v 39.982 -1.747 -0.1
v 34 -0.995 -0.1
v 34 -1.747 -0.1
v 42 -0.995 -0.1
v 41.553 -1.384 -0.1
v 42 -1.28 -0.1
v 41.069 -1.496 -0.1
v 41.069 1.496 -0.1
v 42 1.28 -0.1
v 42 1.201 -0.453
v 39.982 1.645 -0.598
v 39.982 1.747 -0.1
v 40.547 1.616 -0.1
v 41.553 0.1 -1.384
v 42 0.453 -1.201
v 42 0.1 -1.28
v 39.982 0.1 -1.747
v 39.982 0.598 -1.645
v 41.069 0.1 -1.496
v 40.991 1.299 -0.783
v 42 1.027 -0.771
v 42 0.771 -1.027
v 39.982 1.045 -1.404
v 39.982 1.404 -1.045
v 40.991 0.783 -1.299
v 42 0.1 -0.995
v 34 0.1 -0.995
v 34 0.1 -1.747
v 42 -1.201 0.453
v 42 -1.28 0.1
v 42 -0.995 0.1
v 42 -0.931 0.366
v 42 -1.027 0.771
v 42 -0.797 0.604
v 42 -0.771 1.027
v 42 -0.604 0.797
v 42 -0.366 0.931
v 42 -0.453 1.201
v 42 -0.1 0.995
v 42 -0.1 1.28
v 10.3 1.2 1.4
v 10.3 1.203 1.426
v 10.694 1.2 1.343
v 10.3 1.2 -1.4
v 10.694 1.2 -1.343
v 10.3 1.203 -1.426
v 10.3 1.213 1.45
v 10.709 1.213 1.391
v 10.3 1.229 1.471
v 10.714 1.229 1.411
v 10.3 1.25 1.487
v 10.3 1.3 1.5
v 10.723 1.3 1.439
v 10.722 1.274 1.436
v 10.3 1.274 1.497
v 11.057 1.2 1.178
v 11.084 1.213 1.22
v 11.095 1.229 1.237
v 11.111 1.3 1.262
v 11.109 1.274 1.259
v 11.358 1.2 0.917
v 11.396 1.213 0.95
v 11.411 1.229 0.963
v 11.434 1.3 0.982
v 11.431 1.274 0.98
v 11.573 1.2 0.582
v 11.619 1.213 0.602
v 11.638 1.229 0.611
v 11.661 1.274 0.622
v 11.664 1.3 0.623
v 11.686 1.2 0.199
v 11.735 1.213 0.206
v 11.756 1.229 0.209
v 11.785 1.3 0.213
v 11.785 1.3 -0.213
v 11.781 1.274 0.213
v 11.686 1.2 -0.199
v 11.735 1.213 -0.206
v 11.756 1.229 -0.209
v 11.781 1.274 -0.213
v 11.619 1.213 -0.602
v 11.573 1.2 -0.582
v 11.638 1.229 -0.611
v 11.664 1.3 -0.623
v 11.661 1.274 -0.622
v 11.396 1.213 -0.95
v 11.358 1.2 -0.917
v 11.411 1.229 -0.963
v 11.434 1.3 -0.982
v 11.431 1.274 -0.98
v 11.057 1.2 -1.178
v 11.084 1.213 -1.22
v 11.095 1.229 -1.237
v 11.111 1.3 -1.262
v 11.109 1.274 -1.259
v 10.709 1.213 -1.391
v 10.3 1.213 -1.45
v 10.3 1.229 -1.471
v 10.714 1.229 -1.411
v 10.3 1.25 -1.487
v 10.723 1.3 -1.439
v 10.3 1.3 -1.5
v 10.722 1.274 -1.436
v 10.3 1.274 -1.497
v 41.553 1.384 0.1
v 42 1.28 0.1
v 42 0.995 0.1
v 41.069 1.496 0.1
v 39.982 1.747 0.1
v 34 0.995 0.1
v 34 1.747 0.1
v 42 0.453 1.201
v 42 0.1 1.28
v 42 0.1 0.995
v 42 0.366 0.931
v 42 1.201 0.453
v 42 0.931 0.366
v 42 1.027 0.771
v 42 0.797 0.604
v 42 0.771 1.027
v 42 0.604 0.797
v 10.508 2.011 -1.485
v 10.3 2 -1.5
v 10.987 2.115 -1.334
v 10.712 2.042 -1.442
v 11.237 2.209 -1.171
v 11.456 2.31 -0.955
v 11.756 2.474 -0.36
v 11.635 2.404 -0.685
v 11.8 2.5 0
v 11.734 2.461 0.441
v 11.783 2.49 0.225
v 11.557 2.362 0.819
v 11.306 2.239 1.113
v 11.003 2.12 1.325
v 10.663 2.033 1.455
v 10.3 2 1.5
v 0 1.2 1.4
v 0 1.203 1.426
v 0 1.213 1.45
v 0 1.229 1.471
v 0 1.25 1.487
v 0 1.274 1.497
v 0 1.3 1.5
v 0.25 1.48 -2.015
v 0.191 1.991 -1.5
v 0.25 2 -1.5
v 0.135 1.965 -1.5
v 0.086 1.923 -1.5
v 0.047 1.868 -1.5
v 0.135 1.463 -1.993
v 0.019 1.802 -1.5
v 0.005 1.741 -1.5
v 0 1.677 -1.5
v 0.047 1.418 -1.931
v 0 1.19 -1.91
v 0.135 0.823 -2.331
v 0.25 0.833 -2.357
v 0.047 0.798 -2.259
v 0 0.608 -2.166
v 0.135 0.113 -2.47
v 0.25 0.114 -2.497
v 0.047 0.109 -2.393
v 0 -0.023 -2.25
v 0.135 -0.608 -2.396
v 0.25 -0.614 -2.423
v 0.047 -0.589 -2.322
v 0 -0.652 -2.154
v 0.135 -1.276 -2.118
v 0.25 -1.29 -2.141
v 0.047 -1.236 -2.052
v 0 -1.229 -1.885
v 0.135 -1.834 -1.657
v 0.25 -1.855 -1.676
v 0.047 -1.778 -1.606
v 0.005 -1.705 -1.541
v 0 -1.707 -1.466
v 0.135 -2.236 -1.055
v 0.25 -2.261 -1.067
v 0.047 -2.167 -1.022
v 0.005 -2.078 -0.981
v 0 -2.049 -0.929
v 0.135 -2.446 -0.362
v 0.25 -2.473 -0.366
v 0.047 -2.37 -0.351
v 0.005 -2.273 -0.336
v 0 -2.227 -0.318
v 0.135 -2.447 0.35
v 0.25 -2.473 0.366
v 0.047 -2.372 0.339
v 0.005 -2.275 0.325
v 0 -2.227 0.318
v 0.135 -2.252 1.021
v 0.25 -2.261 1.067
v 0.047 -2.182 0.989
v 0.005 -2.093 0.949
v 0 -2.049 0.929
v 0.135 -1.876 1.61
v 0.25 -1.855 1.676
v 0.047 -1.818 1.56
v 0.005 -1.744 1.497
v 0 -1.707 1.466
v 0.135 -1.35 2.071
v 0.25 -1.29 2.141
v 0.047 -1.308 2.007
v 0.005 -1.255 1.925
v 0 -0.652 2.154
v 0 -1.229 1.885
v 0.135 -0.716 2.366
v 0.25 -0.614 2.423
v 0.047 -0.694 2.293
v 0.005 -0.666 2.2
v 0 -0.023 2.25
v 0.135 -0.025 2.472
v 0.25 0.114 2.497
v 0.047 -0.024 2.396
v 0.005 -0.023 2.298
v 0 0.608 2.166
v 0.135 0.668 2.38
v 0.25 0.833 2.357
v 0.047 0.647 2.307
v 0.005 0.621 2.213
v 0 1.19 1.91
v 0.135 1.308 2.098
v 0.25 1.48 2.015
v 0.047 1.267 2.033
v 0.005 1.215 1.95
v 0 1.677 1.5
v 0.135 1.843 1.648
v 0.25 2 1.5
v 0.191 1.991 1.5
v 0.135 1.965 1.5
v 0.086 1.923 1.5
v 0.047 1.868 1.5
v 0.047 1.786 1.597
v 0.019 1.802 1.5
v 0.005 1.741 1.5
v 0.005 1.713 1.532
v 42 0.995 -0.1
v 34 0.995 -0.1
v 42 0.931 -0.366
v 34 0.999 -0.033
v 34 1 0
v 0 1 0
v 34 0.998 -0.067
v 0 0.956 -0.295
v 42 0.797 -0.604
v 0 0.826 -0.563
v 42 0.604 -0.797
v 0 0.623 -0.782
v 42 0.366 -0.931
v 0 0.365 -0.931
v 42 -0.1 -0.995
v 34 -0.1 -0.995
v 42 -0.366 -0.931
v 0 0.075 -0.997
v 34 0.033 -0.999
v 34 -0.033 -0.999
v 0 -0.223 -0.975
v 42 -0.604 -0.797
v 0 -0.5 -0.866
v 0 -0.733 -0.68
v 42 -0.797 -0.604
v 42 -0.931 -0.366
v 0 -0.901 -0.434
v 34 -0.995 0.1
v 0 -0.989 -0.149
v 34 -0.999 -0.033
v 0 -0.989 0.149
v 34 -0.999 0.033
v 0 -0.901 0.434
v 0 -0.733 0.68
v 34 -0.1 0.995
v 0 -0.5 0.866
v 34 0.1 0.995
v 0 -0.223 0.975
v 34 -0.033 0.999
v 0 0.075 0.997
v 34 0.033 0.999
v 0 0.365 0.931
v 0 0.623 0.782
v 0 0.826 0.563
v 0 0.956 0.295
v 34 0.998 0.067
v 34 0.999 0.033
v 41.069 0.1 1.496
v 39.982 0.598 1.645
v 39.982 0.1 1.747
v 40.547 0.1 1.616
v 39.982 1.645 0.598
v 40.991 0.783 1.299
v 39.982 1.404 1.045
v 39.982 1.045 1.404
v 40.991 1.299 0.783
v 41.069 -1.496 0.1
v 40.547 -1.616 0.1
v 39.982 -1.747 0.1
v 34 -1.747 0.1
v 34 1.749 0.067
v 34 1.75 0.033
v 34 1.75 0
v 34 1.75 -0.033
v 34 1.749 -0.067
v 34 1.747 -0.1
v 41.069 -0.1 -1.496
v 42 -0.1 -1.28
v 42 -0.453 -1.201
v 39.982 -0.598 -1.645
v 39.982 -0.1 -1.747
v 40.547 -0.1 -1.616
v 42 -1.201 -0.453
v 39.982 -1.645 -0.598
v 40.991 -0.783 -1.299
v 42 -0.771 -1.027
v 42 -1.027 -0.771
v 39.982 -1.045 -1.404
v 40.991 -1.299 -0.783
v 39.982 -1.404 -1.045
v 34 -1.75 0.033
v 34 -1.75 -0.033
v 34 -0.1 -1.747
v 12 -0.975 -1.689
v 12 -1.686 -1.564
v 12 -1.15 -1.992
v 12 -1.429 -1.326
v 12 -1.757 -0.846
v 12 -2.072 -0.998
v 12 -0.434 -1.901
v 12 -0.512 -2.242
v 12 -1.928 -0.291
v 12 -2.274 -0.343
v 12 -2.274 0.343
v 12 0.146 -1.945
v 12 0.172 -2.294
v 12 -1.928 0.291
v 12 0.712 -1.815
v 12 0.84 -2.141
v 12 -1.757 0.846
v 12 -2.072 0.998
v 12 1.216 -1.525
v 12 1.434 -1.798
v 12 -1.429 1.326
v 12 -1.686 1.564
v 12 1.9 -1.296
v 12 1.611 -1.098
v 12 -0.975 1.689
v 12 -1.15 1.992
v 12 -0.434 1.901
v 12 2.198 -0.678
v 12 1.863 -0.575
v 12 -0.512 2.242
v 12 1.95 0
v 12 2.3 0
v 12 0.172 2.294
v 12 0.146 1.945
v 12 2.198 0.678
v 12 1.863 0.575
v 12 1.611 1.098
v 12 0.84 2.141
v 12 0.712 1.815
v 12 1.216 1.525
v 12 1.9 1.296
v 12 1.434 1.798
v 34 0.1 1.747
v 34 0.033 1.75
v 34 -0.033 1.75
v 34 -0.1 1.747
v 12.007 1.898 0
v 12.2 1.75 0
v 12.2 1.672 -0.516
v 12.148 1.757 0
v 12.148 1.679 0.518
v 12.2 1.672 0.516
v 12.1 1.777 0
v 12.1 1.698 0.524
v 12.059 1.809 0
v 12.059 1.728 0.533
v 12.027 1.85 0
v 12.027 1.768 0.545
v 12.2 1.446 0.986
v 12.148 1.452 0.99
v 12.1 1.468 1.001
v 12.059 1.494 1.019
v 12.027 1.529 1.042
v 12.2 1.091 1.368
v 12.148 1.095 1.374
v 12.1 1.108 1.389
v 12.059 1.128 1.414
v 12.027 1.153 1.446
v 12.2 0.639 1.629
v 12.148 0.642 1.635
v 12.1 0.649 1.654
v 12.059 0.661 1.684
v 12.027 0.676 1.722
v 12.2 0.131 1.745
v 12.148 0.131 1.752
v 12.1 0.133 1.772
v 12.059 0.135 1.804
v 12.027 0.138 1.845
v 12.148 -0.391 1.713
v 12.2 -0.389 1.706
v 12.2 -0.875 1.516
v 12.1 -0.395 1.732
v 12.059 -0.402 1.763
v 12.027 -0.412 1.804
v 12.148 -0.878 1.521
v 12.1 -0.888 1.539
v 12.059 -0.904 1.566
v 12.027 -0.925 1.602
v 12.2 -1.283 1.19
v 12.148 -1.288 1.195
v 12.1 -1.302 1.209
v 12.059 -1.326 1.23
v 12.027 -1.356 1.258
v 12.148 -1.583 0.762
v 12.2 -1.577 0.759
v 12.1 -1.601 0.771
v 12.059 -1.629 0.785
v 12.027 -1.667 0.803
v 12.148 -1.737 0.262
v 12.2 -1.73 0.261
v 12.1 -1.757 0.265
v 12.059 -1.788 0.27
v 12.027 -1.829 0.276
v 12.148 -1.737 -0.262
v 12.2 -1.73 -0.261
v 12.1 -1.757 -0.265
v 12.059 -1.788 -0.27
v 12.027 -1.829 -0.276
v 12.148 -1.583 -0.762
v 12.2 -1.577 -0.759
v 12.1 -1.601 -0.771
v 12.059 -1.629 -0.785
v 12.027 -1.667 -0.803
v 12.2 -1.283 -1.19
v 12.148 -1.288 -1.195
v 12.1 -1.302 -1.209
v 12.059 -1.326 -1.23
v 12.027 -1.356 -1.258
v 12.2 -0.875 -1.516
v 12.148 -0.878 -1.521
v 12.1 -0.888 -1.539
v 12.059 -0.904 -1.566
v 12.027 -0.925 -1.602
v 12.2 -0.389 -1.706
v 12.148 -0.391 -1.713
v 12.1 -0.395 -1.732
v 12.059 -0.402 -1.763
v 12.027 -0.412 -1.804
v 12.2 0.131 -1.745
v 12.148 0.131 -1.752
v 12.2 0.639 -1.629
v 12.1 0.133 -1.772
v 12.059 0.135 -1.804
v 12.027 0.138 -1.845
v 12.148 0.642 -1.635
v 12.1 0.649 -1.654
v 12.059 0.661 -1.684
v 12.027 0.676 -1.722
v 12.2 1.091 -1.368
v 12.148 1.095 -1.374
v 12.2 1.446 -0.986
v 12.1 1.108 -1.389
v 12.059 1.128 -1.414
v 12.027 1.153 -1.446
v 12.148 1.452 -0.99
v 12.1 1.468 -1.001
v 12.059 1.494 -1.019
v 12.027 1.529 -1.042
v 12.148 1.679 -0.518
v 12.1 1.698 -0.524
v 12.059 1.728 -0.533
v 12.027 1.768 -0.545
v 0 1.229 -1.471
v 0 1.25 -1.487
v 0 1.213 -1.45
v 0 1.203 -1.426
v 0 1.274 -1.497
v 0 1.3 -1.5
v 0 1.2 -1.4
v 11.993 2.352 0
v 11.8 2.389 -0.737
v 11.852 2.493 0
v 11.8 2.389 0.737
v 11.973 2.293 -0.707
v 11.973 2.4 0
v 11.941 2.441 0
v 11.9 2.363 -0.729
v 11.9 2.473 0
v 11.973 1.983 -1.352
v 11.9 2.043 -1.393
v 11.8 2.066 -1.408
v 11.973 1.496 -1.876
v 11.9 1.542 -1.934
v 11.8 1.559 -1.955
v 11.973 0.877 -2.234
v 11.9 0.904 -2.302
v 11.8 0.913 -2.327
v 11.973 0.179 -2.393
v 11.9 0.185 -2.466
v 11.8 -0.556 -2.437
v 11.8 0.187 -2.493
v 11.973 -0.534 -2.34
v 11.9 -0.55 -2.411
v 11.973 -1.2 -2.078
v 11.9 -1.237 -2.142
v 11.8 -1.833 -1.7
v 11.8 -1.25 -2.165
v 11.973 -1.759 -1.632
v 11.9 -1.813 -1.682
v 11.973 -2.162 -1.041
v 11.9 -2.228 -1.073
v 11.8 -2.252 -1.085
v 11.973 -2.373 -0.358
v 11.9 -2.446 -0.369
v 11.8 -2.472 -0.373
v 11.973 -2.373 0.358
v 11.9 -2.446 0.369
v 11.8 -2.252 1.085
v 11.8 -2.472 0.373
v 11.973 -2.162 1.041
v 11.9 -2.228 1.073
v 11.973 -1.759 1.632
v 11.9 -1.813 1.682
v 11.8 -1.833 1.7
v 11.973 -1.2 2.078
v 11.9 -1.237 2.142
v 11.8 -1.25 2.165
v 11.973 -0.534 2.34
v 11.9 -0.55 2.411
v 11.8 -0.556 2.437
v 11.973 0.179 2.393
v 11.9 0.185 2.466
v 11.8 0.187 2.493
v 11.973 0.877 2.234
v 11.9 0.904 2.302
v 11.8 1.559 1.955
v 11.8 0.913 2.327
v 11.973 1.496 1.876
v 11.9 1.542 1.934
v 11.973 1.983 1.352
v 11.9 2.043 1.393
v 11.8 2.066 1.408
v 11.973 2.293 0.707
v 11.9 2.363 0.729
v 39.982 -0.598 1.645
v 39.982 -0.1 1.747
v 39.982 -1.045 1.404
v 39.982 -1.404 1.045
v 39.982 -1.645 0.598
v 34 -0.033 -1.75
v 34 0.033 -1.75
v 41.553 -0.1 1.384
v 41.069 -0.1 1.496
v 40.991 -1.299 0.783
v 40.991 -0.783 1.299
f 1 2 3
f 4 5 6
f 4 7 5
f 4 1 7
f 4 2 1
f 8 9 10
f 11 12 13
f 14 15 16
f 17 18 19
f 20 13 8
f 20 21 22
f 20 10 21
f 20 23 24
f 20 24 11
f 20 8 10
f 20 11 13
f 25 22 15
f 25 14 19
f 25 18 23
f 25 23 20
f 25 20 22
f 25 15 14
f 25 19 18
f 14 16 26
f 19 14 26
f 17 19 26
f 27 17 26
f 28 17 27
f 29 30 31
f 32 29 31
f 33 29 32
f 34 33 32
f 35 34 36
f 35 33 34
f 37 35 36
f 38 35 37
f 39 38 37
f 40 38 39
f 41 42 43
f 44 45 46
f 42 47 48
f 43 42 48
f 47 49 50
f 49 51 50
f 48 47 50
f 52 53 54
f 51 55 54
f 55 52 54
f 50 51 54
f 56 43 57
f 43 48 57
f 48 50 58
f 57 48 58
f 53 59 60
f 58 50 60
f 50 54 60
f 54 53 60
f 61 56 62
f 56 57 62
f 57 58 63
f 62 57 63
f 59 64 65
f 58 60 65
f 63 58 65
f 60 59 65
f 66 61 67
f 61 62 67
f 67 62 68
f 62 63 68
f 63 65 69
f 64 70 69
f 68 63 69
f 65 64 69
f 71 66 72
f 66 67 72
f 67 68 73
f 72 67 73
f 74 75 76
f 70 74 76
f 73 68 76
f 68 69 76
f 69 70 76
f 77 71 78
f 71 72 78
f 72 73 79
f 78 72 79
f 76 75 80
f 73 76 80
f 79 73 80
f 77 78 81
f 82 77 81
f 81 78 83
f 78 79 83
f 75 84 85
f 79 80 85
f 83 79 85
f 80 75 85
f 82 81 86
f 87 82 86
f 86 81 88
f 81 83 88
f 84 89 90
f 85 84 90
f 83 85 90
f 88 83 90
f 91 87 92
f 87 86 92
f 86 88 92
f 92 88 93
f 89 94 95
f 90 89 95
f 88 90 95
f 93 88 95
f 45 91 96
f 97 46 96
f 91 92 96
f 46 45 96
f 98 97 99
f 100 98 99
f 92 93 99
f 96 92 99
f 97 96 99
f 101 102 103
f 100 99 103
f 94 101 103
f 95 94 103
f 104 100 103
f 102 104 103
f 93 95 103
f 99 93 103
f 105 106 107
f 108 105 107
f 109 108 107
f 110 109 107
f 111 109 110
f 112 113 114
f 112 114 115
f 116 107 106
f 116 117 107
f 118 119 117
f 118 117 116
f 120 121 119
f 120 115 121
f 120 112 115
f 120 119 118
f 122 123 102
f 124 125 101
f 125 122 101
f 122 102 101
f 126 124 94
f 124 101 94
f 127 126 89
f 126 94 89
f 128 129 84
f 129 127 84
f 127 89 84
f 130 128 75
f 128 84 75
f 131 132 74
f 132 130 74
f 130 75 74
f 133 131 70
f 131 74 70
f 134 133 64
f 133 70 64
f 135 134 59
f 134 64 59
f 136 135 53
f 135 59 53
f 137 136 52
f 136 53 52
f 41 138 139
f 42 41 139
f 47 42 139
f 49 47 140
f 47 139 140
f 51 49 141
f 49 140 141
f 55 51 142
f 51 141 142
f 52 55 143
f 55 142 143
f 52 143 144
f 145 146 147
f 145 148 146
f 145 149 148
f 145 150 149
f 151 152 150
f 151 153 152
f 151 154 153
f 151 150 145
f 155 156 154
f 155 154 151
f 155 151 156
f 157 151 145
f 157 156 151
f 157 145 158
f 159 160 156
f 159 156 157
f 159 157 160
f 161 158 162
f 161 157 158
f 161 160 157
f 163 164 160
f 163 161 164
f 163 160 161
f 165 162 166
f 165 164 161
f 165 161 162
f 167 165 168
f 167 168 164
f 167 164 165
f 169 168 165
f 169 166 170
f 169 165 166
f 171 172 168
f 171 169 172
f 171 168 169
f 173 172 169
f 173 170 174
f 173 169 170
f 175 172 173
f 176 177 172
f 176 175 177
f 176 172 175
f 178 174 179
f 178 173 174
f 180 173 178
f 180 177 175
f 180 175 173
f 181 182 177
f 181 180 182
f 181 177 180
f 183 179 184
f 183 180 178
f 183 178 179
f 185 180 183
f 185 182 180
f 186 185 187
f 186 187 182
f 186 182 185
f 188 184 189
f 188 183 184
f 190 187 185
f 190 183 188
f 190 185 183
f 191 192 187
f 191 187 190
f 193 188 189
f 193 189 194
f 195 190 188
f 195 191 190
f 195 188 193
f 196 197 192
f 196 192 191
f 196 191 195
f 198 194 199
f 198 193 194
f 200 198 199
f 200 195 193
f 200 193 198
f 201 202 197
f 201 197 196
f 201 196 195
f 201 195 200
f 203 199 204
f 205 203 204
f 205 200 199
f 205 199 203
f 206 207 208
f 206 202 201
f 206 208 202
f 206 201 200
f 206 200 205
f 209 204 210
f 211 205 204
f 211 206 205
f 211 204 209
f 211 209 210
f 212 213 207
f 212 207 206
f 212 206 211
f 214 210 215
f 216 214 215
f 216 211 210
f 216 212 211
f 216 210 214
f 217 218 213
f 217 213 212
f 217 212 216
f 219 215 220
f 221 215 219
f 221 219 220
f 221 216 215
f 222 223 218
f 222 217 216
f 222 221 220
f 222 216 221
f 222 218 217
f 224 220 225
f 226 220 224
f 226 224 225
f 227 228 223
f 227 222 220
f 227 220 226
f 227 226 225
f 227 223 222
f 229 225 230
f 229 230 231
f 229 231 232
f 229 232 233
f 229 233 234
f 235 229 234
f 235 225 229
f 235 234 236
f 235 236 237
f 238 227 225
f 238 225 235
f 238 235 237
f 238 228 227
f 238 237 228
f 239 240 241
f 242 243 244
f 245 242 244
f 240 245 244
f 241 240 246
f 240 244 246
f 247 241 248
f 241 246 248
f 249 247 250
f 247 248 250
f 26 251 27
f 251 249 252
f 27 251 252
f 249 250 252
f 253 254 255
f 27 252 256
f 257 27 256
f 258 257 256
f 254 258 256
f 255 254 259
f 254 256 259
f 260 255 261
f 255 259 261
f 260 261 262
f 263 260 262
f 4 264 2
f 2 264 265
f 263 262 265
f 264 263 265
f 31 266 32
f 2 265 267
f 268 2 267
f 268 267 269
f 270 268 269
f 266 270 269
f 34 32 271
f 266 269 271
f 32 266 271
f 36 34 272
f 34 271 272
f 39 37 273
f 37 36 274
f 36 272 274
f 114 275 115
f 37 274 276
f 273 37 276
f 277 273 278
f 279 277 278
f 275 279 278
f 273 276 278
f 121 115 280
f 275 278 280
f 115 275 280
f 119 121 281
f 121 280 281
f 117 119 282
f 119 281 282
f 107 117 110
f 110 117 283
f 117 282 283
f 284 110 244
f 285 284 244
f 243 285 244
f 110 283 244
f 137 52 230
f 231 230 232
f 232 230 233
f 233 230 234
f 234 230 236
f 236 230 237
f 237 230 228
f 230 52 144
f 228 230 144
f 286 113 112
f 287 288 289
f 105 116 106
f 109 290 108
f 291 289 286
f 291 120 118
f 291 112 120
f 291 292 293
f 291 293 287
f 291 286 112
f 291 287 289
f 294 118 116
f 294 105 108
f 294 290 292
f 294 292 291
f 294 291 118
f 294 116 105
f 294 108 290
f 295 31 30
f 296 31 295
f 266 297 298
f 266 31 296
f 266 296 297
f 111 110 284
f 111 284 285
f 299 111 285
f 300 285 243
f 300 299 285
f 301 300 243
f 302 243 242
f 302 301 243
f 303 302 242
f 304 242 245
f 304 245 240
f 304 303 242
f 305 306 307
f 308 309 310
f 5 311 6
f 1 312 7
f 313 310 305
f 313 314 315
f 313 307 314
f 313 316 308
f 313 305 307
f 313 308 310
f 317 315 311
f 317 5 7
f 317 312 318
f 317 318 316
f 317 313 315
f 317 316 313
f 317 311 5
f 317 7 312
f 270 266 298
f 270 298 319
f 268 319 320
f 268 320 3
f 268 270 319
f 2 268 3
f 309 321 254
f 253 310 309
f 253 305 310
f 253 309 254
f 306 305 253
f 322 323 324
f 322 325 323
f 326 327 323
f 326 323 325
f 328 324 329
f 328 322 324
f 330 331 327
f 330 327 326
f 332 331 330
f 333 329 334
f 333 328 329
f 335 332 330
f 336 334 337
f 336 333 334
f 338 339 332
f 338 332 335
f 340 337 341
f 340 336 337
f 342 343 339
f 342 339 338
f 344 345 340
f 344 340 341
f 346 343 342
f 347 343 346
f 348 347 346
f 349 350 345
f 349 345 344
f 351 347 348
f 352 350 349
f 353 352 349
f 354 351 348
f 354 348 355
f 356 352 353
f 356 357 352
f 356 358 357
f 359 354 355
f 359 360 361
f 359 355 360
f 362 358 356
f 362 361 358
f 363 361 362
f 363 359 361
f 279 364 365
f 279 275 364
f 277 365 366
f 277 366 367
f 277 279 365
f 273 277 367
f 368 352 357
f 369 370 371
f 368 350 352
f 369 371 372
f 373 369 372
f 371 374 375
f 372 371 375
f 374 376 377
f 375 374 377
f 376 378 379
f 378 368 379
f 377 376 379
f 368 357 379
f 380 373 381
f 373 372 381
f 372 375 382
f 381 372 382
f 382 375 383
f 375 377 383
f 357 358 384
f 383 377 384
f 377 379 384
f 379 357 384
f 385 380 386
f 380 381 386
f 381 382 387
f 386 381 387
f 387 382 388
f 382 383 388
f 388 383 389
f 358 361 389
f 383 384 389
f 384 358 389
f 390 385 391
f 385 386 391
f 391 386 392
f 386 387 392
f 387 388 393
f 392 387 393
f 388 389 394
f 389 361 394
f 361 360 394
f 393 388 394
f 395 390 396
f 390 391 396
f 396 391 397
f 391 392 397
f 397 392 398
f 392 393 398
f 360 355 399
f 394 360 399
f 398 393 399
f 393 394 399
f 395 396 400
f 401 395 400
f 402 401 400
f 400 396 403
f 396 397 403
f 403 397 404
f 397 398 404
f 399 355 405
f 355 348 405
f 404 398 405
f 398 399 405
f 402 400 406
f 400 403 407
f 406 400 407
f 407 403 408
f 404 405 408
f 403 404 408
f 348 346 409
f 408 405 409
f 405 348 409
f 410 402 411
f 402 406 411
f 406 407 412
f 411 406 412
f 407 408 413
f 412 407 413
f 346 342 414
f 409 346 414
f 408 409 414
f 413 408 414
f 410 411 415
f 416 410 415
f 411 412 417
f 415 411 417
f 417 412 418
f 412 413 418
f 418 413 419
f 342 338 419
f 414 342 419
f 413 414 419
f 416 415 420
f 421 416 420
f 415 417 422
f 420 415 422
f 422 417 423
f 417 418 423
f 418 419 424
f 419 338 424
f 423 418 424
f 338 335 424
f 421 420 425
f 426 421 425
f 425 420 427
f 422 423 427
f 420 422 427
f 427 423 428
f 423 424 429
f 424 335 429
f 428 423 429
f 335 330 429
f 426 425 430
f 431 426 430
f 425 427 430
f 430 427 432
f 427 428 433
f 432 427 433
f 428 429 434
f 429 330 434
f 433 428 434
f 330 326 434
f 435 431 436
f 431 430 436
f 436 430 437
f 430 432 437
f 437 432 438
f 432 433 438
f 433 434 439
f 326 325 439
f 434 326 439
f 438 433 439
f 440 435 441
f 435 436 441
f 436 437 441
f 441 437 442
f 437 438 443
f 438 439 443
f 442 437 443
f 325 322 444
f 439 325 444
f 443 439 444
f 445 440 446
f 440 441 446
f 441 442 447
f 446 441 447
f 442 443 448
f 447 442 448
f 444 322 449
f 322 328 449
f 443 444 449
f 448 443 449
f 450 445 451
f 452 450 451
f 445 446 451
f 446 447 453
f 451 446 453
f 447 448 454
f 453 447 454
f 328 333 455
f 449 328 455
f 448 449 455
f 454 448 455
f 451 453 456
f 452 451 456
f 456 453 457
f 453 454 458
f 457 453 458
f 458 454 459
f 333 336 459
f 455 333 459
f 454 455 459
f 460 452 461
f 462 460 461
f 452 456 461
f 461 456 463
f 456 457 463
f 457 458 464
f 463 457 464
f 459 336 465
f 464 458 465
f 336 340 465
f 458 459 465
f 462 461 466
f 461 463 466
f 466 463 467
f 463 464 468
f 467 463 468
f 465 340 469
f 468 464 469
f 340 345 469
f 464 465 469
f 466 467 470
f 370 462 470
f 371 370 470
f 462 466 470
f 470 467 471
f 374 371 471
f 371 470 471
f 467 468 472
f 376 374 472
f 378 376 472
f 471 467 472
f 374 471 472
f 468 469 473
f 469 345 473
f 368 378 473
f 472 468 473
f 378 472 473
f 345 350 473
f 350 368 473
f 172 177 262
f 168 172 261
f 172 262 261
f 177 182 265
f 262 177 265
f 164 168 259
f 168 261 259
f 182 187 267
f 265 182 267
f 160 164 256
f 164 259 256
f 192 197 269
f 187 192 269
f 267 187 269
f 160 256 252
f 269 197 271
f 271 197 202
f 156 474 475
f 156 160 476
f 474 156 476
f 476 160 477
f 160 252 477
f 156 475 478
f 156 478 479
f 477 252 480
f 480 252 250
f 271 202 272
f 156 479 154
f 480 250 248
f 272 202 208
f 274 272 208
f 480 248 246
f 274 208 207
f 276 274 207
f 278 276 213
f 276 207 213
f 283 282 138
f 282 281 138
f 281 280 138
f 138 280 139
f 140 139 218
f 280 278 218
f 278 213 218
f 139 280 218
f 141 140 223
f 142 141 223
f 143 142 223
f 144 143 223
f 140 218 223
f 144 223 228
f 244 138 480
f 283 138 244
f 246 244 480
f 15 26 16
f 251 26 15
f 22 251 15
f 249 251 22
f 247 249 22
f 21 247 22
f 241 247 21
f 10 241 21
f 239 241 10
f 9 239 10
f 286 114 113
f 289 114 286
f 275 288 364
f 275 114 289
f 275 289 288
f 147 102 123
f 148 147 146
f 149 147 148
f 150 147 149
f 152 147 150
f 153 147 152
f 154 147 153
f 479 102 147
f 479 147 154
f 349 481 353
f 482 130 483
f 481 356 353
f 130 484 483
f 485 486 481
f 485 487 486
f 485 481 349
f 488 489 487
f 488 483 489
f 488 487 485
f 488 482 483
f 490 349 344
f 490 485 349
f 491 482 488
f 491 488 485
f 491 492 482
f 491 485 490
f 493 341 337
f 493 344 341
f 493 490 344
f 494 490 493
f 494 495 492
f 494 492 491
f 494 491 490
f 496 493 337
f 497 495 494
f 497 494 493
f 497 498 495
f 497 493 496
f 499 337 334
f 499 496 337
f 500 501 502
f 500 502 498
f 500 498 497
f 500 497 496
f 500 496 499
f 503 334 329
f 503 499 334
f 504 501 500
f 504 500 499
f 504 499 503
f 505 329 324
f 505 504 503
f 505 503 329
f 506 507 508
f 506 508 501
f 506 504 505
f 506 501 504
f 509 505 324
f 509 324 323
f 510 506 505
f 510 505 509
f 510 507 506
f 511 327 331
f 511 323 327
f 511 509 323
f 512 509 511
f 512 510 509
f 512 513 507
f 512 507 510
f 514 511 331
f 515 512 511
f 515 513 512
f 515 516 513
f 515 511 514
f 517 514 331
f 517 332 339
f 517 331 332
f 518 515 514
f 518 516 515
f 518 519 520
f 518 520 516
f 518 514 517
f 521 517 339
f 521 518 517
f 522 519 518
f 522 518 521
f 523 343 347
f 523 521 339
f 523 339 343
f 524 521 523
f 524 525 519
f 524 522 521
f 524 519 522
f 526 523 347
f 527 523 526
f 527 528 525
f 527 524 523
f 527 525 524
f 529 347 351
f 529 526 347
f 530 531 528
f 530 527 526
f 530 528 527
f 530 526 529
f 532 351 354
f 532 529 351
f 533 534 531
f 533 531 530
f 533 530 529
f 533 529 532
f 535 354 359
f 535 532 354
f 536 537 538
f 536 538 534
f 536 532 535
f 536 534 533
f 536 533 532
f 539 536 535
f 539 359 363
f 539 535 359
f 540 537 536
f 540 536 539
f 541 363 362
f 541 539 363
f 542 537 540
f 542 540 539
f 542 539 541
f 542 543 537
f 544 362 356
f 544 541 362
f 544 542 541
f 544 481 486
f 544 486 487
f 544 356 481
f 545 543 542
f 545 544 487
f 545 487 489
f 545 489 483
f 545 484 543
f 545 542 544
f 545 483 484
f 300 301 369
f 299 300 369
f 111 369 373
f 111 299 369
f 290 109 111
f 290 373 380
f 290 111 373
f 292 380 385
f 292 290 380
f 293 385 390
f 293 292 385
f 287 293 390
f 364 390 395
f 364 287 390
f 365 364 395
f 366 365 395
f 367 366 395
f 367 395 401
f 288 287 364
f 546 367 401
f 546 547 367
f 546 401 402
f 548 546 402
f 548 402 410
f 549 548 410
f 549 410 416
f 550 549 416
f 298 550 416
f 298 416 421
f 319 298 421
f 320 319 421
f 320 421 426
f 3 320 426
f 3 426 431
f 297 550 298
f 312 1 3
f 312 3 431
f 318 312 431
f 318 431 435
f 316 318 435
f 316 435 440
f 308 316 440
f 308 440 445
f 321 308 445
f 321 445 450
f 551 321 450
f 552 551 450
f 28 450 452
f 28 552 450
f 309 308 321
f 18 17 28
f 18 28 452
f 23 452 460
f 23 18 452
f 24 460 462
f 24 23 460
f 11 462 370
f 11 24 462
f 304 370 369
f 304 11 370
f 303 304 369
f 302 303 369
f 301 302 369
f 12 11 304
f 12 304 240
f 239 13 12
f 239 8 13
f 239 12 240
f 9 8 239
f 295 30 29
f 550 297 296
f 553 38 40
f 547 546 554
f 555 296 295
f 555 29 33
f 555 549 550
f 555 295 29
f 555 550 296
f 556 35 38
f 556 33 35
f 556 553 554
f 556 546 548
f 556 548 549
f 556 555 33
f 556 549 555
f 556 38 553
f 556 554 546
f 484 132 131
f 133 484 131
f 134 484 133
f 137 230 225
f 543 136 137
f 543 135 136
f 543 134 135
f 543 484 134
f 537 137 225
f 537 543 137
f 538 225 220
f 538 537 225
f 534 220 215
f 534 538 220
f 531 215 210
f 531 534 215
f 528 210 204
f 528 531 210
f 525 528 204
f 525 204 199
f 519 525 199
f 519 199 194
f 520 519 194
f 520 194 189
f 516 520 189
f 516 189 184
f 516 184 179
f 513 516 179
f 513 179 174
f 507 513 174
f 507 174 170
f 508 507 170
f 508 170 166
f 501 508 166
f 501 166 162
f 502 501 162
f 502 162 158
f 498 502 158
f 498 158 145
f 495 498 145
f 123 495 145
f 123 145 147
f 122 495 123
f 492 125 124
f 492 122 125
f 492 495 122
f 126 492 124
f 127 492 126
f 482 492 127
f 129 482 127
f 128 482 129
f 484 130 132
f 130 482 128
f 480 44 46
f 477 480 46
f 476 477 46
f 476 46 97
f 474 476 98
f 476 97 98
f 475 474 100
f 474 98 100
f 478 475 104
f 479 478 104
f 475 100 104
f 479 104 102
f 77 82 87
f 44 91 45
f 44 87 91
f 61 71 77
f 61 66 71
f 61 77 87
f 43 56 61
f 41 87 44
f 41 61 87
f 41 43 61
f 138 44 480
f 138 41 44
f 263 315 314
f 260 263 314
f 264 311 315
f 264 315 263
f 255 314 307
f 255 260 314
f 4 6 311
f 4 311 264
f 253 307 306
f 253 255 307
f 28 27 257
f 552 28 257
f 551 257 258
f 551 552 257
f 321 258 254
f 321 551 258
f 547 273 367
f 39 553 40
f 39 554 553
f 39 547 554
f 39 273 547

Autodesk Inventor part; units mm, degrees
ref_plane "YZ Plane" through (0, 0, 0) normal (1, 0, 0) x (0, 1, 0)
ref_plane "XY Plane" through (0, 0, 0) normal (0, 0, 1) x (1, 0, 0)
sketch "Skizze1" plane through (0, 0, 0) normal (0, 0, 1) x (1, 0, 0)
  line L0 (42, 1) -> (0, 1)
  line L1 (0, 2.25) -> (0, 1)
  arc A0 (0.25, 2.5) -> (0, 2.25) centre (0.25, 2.25) ccw
  line L2 (0.25, 2.5) -> (12, 2.5)
  line L3 (12, 1.75) -> (12, 2.5)
  line L4 (34, 1) -> (34, 0.995)
  line L5 (-8.4621, 0) -> (50.4104, 0) projected
  line L6 (0, 0.6836) -> (0, 2.8631) projected
  line L7 (11.9997, 1.75) -> (39.9817, 1.75)
  line L8 (42, 1) -> (42, 1.284)
  line L9 (42, 1.284) -> (39.9817, 1.75)
  dimension "d0" = 2
  dimension "d1" = 5
  dimension "d8" = 42
  dimension "d9" = 0.25
  dimension "d10" = 3.5
  dimension "d24" = 103
revolve "Umdrehung1" add sketch "Skizze1" angle 360 about axis through (-10, 0, 0) along (1, 0, 0)
ref_plane "Arbeitsebene1" through (0, 1.2, 0) normal (0, 1, 0) x (-1, 0, 0)
sketch "Skizze2" plane through (0, 1.2, 0) normal (0, 1, 0) x (-1, 0, 0)
  line L0 (8.4, 0) -> (-50.4, 0) projected
  arc A0 (-10.3, 1.5) -> (-10.3, -1.5) centre (-10.3, 0) ccw
  line L1 (0, 1) -> (0, -1) projected
  line L2 (-10.3, -1.5) -> (0, -1.5)
  line L3 (-42, -1) -> (0, -1) projected
  line L4 (-10.3, 1.5) -> (0, 1.5)
  line L5 (0, 2.25) -> (0, -2.25) projected
  line L6 (0, 1.5) -> (0, -1.5)
  point P0 (0, 0)
  dimension "d13" = 3
  dimension "d14" = 10.3
extrude "Extrusion1" cut sketch "Skizze2" along normal through all
sketch "Skizze3" plane through (0, 0, 0) normal (0, 0, 1) x (1, 0, 0)
  line L0 (-8.4, 0) -> (50.4, 0) projected
  line L1 (42, 0.1) -> (34, 0.1)
  line L2 (34, 0.1) -> (34, -0.1)
  line L3 (34, -0.1) -> (42, -0.1)
  line L4 (42, -0.1) -> (42, 0.1)
  line L5 (42, -1) -> (42, 1) projected
  point P0 (0, 0)
  dimension "d17" = 8
  dimension "d18" = 0.2
extrude "Extrusion2" cut sketch "Skizze3" along normal through all both and the other way through all
pattern_circular "Runde Anordnung1" count 4 over 360 about axis through (25.9908, 0, 0) along (1, 0, 0) of "Extrusion2"
thread "Gewinde1" size "M3.5x0.6" class "6g" standard "ISO Metric profile" length 10 offset 21
fillet "Rundung1" radius 0.2 2 edges at (12, -1.75, 0) (12, -2.5, 0)
fillet "Rundung2" radius 0.1 3 edges at (11.8, 1.2, 0) (5.15, 1.2, 1.5) (5.15, 1.2, -1.5)
properties part number "YTP-AP-E14-R1.0"
